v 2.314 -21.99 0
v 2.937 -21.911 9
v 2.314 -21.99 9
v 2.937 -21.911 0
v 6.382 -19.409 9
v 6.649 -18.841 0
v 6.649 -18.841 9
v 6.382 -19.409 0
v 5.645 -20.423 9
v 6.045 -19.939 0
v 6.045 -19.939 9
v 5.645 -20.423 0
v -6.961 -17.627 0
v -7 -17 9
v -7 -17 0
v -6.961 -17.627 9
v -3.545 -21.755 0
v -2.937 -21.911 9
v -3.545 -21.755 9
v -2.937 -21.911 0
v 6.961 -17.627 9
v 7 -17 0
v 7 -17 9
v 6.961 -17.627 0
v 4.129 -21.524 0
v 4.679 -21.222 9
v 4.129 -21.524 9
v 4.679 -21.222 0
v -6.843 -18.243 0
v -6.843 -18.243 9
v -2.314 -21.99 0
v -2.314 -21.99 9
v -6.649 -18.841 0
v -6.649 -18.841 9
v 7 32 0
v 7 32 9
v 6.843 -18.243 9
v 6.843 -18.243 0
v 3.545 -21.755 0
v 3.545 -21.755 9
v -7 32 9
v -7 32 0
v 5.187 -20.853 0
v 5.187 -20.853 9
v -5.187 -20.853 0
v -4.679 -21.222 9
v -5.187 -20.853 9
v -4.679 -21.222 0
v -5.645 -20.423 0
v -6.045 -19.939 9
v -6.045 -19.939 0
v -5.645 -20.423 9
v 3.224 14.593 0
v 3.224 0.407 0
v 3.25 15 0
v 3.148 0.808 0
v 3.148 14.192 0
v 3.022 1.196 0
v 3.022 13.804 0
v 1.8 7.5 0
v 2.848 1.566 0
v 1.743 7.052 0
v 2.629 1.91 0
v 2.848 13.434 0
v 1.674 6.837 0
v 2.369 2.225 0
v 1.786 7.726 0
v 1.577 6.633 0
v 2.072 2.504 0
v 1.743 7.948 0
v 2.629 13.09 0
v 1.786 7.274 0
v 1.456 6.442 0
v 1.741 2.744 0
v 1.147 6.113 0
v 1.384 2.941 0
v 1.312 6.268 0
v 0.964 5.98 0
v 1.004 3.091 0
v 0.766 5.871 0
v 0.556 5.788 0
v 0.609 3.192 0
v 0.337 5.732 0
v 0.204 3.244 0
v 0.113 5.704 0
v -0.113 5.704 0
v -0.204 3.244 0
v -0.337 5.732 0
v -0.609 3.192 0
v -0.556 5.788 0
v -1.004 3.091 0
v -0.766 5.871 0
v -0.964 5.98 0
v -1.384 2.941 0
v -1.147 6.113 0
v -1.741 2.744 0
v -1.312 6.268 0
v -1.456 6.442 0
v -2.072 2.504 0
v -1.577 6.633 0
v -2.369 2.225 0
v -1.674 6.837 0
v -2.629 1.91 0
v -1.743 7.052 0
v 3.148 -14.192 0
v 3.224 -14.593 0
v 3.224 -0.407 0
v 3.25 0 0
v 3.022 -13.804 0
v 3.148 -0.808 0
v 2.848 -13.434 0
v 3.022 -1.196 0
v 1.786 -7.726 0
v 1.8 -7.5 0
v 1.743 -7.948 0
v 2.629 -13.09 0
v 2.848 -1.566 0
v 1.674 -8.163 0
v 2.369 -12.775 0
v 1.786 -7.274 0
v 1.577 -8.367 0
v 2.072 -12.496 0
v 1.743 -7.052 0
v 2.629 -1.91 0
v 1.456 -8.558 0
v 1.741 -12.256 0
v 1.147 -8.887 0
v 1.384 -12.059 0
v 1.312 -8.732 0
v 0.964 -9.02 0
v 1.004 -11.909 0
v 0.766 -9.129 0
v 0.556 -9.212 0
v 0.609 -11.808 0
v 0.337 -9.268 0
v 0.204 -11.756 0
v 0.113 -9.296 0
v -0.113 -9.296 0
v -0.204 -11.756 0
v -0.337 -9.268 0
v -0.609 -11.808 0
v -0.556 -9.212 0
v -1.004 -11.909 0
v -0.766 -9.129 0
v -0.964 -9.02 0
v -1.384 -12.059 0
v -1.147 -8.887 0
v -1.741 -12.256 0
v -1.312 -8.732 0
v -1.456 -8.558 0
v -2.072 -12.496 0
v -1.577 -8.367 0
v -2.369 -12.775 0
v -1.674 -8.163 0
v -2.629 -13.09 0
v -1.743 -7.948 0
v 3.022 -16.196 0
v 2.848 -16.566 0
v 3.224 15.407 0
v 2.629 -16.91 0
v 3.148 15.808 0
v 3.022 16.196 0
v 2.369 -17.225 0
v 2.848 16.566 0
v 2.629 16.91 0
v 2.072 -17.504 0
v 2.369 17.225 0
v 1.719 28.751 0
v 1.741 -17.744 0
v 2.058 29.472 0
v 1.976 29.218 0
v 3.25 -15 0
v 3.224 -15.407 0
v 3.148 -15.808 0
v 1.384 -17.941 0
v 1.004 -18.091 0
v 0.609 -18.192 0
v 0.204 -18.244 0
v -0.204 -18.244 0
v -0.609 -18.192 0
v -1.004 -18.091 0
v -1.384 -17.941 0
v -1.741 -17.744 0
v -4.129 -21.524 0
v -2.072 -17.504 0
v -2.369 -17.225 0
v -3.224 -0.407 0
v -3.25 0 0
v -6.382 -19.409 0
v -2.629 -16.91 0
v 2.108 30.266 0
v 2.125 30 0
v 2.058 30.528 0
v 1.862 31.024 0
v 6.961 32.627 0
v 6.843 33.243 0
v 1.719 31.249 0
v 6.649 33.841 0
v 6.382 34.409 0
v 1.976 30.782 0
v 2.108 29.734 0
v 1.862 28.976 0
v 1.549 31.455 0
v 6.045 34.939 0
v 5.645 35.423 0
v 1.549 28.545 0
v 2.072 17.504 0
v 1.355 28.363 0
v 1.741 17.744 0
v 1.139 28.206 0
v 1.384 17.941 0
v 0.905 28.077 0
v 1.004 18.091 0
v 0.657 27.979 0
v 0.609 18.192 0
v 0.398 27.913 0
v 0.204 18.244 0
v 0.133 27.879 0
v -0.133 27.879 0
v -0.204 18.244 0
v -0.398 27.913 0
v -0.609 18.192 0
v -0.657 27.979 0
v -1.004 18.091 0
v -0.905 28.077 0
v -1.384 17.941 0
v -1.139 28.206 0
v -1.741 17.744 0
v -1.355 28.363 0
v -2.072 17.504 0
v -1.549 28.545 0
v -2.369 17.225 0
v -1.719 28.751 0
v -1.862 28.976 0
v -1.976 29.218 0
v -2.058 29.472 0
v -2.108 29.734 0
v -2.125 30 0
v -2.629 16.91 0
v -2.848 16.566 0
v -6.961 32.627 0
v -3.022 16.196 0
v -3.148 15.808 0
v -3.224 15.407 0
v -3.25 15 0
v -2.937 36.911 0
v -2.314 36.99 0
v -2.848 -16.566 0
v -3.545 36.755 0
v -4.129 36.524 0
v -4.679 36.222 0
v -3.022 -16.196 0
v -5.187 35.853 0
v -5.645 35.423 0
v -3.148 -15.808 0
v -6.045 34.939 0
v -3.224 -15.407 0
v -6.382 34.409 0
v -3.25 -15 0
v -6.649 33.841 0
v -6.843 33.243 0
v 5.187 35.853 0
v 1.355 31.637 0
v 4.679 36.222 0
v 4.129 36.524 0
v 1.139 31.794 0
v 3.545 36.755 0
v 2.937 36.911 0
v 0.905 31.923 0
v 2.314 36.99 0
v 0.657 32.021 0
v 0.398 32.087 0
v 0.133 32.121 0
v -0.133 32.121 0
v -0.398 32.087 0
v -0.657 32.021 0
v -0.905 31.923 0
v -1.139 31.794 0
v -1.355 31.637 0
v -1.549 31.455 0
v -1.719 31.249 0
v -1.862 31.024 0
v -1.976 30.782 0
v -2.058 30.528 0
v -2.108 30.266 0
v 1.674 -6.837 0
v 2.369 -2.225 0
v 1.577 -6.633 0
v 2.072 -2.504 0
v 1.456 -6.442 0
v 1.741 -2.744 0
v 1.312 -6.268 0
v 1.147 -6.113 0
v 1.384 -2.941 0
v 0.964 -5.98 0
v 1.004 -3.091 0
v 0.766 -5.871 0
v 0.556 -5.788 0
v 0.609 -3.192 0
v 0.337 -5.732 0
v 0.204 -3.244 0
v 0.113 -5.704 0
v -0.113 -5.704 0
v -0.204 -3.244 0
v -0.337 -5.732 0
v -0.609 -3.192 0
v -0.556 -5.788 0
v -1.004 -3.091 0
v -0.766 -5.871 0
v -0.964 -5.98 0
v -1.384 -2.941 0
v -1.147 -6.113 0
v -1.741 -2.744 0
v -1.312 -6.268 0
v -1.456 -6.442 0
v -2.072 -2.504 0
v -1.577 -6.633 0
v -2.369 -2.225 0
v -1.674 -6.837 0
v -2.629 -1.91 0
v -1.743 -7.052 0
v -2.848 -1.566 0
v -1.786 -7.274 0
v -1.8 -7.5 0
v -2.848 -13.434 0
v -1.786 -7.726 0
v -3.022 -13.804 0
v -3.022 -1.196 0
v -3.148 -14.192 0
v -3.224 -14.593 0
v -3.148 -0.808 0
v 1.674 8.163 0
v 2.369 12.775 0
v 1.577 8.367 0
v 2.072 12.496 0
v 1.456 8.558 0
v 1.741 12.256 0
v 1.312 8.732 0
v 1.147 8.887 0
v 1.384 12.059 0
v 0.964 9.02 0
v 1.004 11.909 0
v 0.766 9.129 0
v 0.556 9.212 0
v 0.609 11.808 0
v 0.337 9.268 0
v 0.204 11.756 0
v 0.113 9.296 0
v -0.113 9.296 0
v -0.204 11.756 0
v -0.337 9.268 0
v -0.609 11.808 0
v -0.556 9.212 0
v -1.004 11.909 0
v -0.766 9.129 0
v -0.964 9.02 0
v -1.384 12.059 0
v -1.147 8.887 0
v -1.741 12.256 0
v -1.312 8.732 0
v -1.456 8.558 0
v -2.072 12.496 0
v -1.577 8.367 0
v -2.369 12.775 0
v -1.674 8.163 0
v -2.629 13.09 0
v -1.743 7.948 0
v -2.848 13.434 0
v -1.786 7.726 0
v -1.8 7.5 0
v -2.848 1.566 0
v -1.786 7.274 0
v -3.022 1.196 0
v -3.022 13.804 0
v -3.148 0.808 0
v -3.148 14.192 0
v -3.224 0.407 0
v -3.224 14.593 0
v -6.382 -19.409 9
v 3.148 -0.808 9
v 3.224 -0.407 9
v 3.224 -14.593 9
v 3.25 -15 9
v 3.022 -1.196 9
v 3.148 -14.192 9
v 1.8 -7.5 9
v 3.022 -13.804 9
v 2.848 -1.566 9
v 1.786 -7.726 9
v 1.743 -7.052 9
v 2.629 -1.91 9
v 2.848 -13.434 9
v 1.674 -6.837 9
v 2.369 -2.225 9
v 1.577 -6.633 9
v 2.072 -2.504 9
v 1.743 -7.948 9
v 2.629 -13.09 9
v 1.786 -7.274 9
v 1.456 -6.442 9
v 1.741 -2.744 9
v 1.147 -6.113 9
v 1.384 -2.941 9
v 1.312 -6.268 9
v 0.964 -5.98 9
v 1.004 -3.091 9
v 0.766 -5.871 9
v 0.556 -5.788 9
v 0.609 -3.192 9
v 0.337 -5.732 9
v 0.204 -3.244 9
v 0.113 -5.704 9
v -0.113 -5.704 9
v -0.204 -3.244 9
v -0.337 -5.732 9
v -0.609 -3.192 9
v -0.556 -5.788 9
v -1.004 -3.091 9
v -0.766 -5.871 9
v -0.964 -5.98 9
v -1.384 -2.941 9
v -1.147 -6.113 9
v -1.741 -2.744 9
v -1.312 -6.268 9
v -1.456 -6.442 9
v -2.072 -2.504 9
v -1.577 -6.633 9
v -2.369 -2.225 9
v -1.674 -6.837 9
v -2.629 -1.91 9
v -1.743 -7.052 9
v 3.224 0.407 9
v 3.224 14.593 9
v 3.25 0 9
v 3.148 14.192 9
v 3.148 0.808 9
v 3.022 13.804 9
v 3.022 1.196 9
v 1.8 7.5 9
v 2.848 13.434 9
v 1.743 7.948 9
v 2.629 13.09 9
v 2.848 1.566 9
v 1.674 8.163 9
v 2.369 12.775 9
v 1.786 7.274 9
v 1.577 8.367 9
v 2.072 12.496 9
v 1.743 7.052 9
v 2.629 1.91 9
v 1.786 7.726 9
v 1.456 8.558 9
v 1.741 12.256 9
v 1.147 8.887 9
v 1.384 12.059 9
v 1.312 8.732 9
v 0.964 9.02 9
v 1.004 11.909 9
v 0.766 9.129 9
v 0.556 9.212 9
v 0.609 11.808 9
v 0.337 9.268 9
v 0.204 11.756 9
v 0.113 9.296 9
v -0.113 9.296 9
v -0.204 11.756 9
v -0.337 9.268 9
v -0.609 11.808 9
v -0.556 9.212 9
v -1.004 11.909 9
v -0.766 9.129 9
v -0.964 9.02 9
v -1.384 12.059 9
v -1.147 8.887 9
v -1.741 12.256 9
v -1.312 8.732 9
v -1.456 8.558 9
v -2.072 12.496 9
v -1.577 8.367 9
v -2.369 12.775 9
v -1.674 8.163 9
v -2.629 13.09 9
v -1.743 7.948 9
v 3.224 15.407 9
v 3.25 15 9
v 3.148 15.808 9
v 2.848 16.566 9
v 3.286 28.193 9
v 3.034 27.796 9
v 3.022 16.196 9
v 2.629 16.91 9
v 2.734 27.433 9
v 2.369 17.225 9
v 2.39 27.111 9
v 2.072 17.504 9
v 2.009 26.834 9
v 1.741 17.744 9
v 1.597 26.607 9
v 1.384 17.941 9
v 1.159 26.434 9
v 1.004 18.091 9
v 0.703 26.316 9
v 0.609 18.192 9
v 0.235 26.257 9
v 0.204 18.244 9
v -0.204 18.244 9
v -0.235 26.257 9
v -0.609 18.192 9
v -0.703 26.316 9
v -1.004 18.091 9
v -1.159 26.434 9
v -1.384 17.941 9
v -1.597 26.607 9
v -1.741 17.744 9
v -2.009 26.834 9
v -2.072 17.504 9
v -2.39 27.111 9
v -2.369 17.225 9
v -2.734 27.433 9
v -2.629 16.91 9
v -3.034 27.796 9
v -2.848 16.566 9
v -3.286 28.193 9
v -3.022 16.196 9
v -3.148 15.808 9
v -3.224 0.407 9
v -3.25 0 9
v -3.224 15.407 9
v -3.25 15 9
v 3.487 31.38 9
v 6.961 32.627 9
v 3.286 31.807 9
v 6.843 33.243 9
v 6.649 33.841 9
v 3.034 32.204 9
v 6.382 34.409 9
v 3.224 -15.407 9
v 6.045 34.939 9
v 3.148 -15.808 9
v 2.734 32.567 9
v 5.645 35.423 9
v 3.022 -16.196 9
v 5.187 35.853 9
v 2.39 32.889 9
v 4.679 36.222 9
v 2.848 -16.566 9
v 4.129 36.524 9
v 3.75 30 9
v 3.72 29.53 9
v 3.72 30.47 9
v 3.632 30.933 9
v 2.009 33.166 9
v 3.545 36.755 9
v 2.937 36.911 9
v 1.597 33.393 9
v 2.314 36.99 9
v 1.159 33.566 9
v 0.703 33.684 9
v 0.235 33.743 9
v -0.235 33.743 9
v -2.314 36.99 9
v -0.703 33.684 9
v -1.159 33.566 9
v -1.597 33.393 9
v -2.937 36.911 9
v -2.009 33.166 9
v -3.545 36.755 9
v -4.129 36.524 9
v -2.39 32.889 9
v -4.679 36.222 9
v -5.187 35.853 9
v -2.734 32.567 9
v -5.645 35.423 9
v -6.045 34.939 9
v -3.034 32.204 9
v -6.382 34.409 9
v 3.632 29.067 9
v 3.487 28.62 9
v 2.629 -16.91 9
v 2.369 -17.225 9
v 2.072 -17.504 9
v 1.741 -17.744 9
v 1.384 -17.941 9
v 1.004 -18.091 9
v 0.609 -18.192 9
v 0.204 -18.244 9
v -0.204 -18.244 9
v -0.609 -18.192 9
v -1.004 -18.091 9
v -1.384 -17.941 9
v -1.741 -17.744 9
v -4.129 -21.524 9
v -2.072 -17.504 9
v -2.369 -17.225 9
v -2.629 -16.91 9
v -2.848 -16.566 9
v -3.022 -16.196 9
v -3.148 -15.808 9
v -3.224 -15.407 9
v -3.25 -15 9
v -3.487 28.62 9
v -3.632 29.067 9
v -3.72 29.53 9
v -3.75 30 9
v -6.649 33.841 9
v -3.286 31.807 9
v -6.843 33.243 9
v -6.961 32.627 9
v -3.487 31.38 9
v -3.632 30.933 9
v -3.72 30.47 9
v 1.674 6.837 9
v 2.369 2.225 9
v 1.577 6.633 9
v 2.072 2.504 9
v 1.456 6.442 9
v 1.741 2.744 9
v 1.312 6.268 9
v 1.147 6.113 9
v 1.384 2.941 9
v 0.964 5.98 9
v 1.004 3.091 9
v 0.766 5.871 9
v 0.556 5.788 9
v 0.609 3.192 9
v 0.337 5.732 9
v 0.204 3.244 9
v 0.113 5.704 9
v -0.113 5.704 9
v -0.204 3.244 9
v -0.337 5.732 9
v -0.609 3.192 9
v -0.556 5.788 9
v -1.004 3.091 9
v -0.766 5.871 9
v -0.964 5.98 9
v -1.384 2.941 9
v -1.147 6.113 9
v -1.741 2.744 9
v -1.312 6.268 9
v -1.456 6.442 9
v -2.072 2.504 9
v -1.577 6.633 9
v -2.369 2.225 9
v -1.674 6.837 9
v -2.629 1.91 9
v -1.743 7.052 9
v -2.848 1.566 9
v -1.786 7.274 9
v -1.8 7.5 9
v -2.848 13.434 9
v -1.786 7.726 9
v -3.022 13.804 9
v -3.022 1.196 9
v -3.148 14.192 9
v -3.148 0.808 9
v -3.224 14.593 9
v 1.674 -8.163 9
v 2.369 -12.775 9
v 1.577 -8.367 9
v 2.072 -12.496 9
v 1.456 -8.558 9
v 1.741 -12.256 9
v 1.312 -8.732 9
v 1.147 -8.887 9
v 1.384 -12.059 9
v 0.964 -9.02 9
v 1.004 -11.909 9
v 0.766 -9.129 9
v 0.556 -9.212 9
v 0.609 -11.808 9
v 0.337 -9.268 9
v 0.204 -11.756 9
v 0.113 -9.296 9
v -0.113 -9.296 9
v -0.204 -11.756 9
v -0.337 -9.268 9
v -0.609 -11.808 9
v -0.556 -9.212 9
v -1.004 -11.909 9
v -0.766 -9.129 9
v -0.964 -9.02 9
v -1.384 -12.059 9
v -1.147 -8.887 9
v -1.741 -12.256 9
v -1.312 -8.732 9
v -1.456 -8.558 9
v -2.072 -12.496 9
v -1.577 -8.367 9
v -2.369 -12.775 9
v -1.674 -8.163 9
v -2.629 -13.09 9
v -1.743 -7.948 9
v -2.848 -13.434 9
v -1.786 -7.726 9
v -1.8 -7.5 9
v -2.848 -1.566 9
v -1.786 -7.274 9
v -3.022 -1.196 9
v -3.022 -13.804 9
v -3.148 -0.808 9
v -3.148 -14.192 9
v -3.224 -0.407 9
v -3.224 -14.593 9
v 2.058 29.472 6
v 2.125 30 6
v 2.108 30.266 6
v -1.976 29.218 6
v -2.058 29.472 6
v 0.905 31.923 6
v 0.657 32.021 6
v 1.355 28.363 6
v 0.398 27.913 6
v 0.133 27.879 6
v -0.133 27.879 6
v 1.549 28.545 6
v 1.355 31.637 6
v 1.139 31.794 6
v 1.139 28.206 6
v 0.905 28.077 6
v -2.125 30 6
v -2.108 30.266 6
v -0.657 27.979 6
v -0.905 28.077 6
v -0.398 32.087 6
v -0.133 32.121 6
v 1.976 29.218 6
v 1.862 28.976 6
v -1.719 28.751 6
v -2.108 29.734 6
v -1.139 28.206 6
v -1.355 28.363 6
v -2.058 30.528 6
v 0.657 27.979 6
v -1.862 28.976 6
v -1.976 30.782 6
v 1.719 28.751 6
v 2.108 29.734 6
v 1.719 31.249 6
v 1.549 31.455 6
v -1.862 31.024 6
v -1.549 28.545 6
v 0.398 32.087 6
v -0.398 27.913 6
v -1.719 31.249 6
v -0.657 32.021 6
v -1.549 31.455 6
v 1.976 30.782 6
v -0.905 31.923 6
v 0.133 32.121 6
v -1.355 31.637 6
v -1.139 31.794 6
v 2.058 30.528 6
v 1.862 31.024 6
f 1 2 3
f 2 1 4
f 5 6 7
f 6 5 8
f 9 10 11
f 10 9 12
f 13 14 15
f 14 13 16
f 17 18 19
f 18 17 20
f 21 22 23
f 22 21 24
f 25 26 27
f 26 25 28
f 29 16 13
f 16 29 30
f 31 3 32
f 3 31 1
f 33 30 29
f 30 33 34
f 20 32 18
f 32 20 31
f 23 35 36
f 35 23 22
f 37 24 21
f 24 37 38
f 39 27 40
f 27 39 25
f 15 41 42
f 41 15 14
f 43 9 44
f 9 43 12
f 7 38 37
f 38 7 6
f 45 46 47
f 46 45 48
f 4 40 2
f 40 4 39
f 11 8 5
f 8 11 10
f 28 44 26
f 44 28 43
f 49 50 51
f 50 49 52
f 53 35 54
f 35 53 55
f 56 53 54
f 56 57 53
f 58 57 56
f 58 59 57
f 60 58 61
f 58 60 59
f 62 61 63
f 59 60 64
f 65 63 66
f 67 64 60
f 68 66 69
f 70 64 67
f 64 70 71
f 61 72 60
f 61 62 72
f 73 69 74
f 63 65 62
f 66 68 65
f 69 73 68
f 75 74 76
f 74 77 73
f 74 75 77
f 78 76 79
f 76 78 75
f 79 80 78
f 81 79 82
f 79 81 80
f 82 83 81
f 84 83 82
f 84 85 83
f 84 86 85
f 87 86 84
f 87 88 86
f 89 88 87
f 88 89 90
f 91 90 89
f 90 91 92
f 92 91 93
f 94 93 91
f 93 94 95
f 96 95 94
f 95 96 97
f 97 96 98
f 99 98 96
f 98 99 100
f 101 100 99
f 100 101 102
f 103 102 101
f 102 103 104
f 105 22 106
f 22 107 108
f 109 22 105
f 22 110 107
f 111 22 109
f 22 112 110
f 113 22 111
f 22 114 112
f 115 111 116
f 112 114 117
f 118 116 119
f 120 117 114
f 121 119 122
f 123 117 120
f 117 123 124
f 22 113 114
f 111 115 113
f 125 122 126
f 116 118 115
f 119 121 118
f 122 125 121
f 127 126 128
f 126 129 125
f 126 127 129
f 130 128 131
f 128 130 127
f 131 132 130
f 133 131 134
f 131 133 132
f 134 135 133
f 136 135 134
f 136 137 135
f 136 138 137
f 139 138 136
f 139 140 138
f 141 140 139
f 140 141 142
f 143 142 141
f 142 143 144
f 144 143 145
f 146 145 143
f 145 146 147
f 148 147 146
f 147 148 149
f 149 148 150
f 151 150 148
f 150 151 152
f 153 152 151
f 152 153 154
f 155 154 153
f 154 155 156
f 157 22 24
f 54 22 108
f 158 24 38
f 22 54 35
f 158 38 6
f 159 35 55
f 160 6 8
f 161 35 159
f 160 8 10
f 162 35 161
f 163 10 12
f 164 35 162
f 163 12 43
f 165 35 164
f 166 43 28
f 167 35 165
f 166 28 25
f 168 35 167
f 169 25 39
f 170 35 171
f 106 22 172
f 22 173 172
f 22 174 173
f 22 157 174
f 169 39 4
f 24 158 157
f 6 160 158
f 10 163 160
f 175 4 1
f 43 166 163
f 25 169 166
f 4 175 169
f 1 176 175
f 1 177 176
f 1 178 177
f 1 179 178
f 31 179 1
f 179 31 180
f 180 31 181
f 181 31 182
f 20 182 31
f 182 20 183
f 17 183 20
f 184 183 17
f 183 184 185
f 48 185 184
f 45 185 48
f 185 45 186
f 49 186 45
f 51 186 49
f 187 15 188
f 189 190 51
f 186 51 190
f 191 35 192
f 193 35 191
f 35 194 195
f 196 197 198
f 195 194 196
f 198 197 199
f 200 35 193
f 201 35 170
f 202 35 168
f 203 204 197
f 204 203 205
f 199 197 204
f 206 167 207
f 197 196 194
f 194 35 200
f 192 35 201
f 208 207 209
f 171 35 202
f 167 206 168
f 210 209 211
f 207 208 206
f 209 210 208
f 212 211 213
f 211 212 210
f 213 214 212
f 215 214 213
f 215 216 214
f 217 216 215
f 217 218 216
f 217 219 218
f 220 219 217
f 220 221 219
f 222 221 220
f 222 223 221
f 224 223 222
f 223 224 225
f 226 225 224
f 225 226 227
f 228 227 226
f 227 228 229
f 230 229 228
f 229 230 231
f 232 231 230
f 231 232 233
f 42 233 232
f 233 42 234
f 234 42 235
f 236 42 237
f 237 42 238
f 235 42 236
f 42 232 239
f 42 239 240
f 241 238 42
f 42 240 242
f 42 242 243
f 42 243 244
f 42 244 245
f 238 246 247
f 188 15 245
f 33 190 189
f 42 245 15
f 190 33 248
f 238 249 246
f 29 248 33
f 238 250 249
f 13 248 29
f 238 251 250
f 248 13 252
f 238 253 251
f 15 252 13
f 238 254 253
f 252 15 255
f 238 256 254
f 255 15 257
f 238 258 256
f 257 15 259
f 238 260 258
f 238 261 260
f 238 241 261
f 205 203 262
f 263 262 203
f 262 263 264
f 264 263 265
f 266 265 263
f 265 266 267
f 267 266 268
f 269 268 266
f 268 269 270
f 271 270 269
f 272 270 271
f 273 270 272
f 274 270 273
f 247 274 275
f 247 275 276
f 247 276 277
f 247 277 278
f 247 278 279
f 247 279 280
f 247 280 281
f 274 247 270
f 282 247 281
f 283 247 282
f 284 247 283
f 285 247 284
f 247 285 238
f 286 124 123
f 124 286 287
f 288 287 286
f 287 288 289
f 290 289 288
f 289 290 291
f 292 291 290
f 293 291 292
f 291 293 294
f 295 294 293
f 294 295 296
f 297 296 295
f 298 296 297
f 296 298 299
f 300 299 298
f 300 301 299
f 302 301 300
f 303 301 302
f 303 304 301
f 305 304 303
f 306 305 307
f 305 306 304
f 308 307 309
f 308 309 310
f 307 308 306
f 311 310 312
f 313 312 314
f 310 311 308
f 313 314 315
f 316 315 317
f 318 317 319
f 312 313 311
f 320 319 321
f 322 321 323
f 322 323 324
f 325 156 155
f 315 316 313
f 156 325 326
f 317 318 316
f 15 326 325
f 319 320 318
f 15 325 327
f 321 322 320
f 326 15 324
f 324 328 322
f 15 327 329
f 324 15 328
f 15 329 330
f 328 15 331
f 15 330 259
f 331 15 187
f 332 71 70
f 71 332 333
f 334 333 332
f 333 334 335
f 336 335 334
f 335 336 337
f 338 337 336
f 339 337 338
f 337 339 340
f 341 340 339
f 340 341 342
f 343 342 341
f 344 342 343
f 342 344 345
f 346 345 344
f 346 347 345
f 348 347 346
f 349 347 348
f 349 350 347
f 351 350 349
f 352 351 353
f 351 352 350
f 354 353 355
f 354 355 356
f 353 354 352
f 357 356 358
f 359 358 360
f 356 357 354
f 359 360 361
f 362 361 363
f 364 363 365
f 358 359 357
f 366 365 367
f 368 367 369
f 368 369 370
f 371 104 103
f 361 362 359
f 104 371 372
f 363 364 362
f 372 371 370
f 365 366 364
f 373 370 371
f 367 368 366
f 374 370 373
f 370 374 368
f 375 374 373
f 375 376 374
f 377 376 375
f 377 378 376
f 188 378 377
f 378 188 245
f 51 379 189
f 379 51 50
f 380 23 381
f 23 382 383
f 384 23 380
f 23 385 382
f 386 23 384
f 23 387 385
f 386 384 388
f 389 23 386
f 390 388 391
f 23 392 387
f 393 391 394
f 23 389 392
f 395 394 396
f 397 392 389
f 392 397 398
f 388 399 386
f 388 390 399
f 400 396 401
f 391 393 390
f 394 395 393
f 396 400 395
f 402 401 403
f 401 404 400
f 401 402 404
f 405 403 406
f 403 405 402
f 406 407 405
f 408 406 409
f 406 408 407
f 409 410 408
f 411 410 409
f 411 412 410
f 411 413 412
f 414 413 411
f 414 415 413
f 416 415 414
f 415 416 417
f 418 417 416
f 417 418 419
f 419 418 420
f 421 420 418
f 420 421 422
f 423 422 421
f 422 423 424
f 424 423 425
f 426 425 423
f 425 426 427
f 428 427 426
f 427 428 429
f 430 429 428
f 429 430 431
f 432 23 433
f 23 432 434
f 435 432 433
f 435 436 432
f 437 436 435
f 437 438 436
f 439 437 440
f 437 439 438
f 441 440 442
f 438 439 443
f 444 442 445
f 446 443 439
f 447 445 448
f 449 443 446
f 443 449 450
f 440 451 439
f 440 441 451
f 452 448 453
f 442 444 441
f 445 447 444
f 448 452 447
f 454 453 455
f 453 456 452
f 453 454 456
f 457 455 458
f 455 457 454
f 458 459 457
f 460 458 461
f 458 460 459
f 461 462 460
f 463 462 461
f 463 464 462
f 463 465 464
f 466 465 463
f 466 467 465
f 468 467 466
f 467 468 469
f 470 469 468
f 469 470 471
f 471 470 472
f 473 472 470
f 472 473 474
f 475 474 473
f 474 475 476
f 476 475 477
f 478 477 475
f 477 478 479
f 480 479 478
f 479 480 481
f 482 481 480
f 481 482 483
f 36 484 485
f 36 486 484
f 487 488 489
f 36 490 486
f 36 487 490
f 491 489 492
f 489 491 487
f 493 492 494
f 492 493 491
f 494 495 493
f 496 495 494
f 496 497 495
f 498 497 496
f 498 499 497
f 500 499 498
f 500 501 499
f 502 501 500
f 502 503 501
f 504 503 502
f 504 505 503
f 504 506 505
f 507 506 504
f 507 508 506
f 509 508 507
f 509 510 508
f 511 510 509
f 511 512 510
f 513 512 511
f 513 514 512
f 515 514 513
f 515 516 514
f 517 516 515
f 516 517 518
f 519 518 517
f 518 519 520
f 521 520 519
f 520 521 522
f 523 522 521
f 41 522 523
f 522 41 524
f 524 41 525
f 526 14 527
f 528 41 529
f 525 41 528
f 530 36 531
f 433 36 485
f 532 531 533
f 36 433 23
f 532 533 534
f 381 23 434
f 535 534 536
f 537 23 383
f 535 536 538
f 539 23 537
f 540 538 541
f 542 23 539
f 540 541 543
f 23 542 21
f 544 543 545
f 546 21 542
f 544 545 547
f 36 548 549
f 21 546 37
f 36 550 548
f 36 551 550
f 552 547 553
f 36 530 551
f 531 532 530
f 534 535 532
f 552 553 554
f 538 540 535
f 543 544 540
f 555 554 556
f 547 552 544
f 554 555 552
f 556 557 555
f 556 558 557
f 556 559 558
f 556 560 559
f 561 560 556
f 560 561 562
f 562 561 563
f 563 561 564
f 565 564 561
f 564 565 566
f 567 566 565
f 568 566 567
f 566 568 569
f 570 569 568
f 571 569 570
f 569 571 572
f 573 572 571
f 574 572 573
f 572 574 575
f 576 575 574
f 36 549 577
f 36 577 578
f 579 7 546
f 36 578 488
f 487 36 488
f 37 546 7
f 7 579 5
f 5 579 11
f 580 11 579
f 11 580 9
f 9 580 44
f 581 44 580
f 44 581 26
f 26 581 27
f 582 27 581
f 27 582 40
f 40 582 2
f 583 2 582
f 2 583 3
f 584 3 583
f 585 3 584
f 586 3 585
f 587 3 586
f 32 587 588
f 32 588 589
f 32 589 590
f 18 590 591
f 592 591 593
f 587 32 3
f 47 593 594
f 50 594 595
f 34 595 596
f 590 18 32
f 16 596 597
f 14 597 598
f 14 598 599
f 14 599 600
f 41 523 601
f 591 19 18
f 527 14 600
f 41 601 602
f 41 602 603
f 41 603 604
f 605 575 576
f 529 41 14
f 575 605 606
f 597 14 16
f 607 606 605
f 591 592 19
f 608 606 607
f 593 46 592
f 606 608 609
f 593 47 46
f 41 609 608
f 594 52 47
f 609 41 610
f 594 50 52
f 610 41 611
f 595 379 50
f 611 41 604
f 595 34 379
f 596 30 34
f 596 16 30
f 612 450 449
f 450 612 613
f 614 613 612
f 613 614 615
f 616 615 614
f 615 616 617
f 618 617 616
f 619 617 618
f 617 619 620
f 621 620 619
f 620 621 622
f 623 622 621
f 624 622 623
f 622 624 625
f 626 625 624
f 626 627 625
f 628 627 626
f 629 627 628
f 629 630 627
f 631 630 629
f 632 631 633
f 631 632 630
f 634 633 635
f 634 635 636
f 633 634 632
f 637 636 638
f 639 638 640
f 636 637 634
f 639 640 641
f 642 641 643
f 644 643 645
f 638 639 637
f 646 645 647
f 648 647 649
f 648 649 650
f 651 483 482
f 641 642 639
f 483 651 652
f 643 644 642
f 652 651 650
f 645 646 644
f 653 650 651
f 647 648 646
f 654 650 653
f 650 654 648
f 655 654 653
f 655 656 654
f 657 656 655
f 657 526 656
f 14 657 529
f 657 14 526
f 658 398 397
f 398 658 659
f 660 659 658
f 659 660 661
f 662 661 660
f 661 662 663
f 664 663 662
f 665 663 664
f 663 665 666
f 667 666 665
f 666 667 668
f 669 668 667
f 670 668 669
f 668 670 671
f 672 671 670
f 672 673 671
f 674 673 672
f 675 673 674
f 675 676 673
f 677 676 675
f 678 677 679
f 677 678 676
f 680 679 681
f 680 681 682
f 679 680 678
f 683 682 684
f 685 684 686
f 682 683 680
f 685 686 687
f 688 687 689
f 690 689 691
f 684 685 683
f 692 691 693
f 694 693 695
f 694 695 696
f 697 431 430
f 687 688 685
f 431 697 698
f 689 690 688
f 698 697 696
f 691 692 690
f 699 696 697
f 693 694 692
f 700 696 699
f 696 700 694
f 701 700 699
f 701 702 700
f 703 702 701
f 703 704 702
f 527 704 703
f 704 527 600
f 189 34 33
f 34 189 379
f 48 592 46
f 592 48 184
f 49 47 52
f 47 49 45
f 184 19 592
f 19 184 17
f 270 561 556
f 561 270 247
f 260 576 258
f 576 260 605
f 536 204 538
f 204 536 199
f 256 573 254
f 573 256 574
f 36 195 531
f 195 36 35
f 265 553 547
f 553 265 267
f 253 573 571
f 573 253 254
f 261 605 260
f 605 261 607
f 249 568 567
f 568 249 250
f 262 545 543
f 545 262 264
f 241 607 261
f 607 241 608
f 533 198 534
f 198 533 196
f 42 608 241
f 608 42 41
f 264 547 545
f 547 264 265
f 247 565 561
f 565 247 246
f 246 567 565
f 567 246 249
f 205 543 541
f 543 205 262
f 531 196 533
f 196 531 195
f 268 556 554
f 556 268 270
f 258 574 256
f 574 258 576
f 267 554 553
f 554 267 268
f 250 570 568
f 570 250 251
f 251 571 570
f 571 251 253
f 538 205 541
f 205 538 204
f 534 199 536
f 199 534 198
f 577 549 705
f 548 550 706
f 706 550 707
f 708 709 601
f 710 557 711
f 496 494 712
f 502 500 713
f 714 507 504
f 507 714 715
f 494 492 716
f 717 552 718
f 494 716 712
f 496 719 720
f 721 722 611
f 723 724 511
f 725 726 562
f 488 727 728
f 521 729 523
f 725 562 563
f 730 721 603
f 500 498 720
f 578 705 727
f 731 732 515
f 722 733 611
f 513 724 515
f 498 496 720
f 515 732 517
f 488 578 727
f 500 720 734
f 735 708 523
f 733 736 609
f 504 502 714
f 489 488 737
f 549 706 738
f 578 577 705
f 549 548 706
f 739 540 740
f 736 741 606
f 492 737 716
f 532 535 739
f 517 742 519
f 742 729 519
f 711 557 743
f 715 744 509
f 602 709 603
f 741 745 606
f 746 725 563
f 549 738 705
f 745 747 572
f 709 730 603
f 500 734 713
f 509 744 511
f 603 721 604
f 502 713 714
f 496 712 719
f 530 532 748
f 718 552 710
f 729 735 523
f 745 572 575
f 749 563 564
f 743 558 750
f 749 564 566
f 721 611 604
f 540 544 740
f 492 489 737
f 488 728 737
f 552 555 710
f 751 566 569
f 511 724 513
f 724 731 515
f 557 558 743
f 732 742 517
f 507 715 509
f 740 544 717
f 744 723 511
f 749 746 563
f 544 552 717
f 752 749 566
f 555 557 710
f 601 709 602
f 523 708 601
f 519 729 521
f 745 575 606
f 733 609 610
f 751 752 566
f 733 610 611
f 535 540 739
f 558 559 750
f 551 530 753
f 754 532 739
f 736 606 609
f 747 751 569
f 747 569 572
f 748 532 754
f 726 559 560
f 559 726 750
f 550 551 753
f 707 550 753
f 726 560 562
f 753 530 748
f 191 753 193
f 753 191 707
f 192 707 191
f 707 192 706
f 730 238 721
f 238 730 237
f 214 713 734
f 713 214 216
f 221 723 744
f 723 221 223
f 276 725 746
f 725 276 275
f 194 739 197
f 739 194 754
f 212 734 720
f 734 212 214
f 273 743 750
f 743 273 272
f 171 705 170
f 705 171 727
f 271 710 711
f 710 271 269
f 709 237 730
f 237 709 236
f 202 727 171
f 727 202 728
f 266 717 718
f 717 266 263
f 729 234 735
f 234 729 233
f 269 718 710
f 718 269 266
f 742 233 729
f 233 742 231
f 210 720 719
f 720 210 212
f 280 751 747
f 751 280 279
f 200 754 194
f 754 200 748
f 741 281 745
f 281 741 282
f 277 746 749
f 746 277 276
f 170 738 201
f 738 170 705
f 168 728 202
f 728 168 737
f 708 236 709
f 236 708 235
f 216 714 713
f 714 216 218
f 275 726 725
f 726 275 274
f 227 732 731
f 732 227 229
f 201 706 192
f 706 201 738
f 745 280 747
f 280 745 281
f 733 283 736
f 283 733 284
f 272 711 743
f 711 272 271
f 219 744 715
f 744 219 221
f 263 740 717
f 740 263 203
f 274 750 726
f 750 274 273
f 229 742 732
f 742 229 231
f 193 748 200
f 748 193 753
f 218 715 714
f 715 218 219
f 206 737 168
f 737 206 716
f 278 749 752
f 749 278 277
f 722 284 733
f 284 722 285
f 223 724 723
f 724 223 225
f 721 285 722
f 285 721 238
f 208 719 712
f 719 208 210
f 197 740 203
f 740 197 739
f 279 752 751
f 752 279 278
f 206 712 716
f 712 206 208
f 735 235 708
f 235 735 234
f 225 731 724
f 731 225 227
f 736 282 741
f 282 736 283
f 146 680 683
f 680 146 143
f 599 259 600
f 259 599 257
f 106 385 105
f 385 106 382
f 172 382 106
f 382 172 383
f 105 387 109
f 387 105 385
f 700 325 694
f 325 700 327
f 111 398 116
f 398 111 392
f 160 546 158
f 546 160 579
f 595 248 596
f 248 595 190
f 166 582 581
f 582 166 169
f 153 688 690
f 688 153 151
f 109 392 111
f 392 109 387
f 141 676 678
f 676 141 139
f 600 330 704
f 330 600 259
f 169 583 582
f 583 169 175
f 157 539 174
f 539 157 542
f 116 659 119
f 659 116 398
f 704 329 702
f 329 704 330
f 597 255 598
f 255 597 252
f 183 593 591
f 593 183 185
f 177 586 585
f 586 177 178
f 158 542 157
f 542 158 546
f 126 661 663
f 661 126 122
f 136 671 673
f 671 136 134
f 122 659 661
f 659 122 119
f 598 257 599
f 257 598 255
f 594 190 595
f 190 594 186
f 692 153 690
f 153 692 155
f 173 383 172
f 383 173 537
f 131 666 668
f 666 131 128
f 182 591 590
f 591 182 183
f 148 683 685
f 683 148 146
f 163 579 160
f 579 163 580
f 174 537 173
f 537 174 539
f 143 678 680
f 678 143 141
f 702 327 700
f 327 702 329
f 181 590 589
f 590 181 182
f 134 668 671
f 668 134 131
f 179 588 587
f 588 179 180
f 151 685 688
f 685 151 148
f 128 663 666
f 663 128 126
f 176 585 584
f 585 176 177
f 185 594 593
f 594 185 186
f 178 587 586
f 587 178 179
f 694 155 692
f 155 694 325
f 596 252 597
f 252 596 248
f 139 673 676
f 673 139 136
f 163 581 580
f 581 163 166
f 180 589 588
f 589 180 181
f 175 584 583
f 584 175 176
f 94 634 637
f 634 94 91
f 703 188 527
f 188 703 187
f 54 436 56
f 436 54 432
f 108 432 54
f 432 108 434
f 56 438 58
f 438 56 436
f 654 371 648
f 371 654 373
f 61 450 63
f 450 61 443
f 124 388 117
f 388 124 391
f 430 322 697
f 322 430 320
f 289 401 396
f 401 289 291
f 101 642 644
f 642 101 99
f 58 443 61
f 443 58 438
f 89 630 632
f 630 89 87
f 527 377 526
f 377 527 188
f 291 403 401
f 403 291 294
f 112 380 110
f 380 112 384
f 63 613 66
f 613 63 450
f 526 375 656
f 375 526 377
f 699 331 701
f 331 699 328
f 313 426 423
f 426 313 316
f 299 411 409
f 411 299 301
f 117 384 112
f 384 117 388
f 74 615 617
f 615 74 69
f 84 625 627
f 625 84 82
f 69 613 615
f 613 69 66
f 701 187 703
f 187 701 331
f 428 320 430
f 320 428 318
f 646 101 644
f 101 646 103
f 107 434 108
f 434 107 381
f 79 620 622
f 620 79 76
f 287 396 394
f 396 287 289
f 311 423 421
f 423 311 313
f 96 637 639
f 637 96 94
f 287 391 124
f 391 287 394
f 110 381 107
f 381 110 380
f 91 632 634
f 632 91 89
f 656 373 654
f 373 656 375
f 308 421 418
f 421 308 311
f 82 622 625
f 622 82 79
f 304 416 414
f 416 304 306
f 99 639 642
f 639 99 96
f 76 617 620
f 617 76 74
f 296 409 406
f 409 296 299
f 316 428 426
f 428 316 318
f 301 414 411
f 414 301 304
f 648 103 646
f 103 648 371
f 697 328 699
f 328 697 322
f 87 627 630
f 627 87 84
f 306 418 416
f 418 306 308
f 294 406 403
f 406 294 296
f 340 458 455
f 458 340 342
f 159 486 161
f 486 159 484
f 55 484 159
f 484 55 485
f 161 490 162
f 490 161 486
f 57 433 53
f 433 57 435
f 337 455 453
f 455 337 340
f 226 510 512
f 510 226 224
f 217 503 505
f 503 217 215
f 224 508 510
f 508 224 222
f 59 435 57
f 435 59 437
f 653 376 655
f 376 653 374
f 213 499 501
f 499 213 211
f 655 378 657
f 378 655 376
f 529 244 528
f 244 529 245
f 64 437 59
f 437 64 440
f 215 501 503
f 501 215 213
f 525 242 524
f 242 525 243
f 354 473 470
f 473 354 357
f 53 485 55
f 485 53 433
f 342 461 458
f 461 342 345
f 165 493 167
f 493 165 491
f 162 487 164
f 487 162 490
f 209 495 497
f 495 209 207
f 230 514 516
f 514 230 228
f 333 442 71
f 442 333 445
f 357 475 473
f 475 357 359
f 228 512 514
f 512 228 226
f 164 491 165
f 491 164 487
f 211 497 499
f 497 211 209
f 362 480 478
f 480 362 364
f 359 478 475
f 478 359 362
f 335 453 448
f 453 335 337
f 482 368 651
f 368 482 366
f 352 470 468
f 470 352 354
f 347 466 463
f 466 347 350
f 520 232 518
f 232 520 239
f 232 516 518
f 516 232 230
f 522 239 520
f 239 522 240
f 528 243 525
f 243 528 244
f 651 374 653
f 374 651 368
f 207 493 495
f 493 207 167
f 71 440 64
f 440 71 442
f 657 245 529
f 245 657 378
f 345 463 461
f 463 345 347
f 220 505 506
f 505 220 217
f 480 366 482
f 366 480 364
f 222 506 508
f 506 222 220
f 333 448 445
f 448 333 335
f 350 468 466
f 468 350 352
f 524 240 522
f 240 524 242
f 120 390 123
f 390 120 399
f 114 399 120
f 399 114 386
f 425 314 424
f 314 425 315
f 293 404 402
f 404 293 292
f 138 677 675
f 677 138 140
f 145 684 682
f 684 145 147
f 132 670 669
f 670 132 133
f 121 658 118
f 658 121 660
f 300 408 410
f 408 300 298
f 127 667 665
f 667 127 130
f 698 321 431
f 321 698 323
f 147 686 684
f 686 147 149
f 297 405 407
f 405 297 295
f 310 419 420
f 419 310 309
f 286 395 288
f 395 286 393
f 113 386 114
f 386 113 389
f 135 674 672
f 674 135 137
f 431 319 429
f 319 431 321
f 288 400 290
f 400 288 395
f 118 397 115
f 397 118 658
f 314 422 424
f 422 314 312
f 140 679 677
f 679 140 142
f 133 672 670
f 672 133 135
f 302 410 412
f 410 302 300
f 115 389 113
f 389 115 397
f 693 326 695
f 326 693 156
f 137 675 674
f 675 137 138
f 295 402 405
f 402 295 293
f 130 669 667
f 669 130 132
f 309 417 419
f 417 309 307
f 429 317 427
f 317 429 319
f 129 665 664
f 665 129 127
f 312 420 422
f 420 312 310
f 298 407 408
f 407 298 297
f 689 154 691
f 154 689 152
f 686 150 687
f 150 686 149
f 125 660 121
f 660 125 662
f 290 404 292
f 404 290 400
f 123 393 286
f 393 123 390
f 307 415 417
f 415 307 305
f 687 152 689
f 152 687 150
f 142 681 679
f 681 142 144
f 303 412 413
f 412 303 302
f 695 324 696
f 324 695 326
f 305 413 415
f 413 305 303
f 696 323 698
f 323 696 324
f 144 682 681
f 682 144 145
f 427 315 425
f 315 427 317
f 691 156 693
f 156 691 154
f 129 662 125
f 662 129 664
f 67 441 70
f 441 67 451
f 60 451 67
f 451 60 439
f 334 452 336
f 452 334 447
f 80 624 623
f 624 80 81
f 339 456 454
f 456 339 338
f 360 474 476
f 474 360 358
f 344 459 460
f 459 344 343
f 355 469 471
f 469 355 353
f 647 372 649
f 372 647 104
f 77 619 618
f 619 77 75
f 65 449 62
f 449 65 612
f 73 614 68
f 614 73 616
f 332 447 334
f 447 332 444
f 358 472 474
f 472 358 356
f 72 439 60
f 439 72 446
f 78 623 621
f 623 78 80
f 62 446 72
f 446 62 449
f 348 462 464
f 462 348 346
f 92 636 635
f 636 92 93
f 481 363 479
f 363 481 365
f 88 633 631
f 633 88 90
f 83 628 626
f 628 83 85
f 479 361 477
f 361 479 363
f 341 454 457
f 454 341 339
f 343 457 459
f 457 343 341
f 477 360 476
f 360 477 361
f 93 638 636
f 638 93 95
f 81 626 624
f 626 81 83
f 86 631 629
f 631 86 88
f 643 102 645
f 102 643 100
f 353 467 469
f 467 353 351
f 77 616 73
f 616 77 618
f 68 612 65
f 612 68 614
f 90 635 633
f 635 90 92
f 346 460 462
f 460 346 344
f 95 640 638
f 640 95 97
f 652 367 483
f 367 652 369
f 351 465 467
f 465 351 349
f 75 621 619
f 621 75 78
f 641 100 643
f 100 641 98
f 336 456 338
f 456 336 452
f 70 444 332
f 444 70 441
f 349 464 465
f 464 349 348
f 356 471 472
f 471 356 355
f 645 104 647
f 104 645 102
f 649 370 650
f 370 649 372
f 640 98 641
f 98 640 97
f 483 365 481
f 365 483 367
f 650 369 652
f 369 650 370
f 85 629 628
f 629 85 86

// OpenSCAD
$fn = 50;


difference() {
	union() {
		hull() {
			translate(v = [-2.0000000000, 17.0000000000, 0]) {
				cylinder(h = 9, r = 5);
			}
			translate(v = [2.0000000000, 17.0000000000, 0]) {
				cylinder(h = 9, r = 5);
			}
			translate(v = [-2.0000000000, -17.0000000000, 0]) {
				cylinder(h = 9, r = 5);
			}
			translate(v = [2.0000000000, -17.0000000000, 0]) {
				cylinder(h = 9, r = 5);
			}
		}
		translate(v = [0.0000000000, 22.5000000000, 0]) {
			hull() {
				translate(v = [-2.0000000000, 9.5000000000, 0]) {
					cylinder(h = 9, r = 5);
				}
				translate(v = [2.0000000000, 9.5000000000, 0]) {
					cylinder(h = 9, r = 5);
				}
				translate(v = [-2.0000000000, -9.5000000000, 0]) {
					cylinder(h = 9, r = 5);
				}
				translate(v = [2.0000000000, -9.5000000000, 0]) {
					cylinder(h = 9, r = 5);
				}
			}
		}
		translate(v = [0.0000000000, 22.5000000000, 0]) {
			hull() {
				translate(v = [-2.0000000000, 9.5000000000, 0]) {
					cylinder(h = 9, r = 5);
				}
				translate(v = [2.0000000000, 9.5000000000, 0]) {
					cylinder(h = 9, r = 5);
				}
				translate(v = [-2.0000000000, -9.5000000000, 0]) {
					cylinder(h = 9, r = 5);
				}
				translate(v = [2.0000000000, -9.5000000000, 0]) {
					cylinder(h = 9, r = 5);
				}
			}
		}
	}
	union() {
		translate(v = [0.0000000000, 30.0000000000, 9]) {
			rotate(a = [0, 0, 0]) {
				difference() {
					union() {
						#translate(v = [0, 0, -9.0000000000]) {
							cylinder(h = 9, r = 2.0000000000);
						}
						#translate(v = [0, 0, -3]) {
							cylinder(h = 3, r1 = 2.1250000000, r2 = 3.7500000000);
						}
						#translate(v = [0, 0, -9.0000000000]) {
							cylinder(h = 9, r = 2.1250000000);
						}
						#translate(v = [0, 0, -9.0000000000]) {
							cylinder(h = 9, r = 2.0000000000);
						}
					}
					union();
				}
			}
		}
		translate(v = [0.0000000000, 30.0000000000, 9]) {
			rotate(a = [0, 0, 0]) {
				difference() {
					union() {
						#translate(v = [0, 0, -9.0000000000]) {
							cylinder(h = 9, r = 2.0000000000);
						}
						#translate(v = [0, 0, -3]) {
							cylinder(h = 3, r1 = 2.1250000000, r2 = 3.7500000000);
						}
						#translate(v = [0, 0, -9.0000000000]) {
							cylinder(h = 9, r = 2.1250000000);
						}
						#translate(v = [0, 0, -9.0000000000]) {
							cylinder(h = 9, r = 2.0000000000);
						}
					}
					union();
				}
			}
		}
		translate(v = [0.0000000000, -15.0000000000, 0]) {
			translate(v = [0, 0, -100]) {
				cylinder(h = 200, r = 3.2500000000);
			}
		}
		translate(v = [0, 0, -100]) {
			cylinder(h = 200, r = 3.2500000000);
		}
		translate(v = [0.0000000000, 15.0000000000, 0]) {
			translate(v = [0, 0, -100]) {
				cylinder(h = 200, r = 3.2500000000);
			}
		}
		translate(v = [0.0000000000, -15.0000000000, 0]) {
			translate(v = [0, 0, -100]) {
				cylinder(h = 200, r = 1.8000000000);
			}
		}
		translate(v = [0.0000000000, -7.5000000000, 0]) {
			translate(v = [0, 0, -100]) {
				cylinder(h = 200, r = 1.8000000000);
			}
		}
		translate(v = [0, 0, -100]) {
			cylinder(h = 200, r = 1.8000000000);
		}
		translate(v = [0.0000000000, 7.5000000000, 0]) {
			translate(v = [0, 0, -100]) {
				cylinder(h = 200, r = 1.8000000000);
			}
		}
		translate(v = [0.0000000000, 15.0000000000, 0]) {
			translate(v = [0, 0, -100]) {
				cylinder(h = 200, r = 1.8000000000);
			}
		}
	}
}
